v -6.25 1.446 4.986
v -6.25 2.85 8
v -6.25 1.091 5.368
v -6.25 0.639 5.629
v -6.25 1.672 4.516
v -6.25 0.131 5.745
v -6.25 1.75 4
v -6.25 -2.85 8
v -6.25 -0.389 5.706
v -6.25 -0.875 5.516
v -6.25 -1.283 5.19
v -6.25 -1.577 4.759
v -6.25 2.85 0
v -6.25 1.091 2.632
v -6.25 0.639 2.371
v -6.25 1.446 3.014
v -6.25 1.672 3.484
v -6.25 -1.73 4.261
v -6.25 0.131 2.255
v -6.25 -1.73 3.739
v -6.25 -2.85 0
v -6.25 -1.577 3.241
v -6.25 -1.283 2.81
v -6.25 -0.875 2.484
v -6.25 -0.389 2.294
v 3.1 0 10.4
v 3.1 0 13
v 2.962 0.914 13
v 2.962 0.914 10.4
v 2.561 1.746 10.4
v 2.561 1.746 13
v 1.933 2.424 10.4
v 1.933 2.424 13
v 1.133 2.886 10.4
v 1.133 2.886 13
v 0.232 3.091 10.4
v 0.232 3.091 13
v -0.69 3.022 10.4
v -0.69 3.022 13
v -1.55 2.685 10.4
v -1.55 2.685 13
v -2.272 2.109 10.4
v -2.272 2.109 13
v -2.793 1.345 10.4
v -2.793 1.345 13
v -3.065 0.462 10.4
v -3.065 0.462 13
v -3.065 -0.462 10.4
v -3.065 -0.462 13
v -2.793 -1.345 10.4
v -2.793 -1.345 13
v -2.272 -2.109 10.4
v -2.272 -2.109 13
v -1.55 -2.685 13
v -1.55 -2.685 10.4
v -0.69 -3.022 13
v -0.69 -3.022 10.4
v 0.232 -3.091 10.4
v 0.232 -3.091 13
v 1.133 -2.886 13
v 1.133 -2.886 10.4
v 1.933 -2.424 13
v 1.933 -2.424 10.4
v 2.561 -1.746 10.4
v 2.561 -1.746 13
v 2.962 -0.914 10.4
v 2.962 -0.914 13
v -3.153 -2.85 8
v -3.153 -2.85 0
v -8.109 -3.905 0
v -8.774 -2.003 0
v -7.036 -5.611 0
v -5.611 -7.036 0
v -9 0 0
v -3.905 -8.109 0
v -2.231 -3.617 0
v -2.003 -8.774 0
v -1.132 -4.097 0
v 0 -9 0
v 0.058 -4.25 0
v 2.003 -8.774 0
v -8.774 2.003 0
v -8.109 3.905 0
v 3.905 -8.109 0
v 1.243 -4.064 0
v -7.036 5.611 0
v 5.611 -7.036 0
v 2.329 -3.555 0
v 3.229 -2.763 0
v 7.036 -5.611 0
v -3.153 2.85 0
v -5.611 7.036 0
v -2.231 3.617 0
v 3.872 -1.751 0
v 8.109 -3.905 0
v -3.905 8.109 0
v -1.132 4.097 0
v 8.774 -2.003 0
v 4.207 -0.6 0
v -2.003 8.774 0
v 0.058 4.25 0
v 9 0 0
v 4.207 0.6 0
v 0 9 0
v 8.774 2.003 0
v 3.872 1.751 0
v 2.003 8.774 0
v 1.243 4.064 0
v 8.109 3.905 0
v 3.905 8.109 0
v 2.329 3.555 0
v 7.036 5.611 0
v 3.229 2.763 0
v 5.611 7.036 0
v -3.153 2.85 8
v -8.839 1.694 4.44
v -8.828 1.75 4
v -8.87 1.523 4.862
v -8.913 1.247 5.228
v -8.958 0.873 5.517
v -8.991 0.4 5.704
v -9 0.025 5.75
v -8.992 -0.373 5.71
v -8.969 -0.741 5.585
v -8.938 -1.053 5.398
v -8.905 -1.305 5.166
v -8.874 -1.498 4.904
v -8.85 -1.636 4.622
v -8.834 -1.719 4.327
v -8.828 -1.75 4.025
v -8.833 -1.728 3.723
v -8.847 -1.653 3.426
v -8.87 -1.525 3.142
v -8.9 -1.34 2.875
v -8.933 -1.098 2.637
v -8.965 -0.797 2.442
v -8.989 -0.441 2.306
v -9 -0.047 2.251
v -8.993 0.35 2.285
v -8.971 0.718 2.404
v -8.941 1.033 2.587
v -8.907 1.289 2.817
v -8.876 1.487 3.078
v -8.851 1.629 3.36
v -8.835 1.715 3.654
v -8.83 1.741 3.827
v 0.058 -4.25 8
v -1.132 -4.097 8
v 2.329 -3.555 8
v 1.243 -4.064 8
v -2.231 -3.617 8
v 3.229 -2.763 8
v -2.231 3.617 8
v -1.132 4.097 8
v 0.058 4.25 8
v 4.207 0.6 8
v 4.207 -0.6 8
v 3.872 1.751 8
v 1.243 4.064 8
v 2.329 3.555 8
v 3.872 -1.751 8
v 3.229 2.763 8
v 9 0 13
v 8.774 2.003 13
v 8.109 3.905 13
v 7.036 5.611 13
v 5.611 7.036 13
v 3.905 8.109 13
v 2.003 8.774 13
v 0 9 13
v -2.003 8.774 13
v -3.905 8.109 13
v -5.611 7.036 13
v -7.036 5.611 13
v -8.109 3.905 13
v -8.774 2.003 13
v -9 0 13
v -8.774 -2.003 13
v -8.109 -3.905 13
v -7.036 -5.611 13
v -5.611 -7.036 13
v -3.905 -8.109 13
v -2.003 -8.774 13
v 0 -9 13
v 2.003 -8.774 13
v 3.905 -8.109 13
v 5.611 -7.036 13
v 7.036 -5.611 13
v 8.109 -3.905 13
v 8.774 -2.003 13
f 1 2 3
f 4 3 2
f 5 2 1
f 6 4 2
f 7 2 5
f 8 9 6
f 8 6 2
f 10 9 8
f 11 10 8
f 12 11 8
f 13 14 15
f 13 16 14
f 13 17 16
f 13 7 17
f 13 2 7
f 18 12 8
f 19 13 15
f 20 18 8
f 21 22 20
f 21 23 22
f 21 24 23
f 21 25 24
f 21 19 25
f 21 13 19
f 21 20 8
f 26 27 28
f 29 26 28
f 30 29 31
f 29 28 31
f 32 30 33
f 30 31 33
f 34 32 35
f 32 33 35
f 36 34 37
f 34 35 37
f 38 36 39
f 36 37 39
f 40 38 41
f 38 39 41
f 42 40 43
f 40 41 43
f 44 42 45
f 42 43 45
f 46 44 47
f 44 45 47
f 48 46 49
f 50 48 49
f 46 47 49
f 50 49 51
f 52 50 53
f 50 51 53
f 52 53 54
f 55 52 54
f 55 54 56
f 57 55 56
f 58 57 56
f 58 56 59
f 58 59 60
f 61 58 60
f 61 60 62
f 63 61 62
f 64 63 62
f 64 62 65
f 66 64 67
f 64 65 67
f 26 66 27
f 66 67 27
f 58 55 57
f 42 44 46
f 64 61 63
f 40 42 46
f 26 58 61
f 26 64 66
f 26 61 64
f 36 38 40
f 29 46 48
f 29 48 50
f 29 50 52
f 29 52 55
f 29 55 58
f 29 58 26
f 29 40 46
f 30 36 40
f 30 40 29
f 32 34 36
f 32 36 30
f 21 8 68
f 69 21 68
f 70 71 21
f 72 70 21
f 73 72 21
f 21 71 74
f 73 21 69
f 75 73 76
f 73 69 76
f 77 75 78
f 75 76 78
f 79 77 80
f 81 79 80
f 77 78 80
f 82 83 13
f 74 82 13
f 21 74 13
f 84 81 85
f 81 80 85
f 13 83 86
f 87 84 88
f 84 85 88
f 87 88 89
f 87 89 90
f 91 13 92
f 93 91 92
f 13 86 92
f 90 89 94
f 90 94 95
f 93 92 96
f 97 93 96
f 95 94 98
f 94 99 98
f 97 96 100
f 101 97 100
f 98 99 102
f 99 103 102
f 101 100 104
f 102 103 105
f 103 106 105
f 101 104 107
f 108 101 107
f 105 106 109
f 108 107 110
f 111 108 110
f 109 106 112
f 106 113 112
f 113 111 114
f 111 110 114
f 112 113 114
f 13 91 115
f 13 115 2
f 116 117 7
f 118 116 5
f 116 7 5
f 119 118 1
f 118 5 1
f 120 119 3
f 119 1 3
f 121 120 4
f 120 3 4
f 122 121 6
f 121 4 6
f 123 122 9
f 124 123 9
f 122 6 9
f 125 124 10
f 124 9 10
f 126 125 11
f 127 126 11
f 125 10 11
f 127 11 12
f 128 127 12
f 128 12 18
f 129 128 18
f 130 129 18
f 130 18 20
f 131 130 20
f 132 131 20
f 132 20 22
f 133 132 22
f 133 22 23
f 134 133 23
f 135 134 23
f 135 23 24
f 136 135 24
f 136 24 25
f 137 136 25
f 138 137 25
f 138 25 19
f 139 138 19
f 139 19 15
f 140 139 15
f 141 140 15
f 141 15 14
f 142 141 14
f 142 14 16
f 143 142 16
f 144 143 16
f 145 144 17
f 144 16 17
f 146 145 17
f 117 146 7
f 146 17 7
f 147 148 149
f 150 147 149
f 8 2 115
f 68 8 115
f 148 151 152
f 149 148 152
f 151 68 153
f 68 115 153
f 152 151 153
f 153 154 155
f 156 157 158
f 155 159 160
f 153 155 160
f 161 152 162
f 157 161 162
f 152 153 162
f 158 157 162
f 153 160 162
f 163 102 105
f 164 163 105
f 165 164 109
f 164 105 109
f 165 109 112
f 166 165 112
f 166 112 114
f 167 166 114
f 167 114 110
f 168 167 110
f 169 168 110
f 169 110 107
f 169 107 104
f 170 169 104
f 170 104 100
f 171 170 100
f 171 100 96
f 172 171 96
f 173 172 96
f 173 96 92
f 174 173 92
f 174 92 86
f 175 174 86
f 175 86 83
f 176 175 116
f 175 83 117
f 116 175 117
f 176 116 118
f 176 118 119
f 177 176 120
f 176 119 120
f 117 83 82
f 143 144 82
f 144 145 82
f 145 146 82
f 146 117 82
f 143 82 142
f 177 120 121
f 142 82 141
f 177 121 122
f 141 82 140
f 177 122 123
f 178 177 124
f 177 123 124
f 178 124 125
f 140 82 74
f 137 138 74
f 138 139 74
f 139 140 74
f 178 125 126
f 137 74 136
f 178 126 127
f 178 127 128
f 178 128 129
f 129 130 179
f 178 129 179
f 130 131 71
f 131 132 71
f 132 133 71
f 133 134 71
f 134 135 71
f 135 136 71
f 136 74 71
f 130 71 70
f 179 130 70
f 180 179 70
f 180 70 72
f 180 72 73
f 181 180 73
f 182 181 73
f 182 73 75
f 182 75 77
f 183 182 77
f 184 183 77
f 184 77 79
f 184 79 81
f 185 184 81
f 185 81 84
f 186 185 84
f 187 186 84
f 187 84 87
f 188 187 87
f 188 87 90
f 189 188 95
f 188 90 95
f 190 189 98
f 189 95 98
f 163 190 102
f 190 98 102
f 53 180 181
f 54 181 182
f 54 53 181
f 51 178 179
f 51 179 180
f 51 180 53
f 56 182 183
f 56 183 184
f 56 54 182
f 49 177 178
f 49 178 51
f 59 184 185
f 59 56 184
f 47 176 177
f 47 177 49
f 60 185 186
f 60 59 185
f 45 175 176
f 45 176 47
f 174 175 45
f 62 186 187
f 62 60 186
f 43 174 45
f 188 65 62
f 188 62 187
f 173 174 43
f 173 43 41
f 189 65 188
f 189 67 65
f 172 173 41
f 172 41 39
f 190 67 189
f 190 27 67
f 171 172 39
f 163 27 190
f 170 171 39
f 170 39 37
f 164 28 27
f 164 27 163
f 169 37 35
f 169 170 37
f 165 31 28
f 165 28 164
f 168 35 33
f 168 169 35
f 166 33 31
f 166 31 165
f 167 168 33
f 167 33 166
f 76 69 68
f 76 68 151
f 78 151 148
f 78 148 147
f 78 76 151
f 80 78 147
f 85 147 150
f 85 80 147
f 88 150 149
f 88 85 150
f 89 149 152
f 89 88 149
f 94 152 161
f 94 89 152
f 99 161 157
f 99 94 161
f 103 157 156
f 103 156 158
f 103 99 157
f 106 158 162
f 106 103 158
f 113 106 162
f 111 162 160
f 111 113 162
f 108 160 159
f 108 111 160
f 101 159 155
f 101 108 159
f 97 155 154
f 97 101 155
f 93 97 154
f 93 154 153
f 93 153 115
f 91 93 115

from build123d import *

# Parameters (mm, degrees)
SKETCH136_R     = 9
PAD081_DEPTH    = 13
POCKET045_DEPTH = 8
SKETCH138_R     = 3.1
POCKET046_DEPTH = 2.6
SKETCH139_R     = 1.75
POCKET047_DEPTH = 9.001


with BuildPart() as part:
    # Sketch136 → Pad081 (new body)
    with BuildSketch(Plane.XY):
        Circle(SKETCH136_R)
    extrude(amount=PAD081_DEPTH)

    # Sketch137 → Pocket045 (cut)
    with BuildSketch(Plane.XY):
        with BuildLine():
            Line((-3.152776, 2.850001), (-6.25, 2.850001))
            Line((-6.25, 2.850001), (-6.25, -2.850001))
            Line((-6.25, -2.850001), (-3.152776, -2.850001))
            ThreePointArc((-3.152776, -2.850001), (4.25, 0), (-3.152776, 2.850001))
        make_face()
    extrude(amount=POCKET045_DEPTH, mode=Mode.SUBTRACT)

    # Sketch138 → Pocket046 (cut)
    with BuildSketch(Plane.XY.offset(13)):
        Circle(SKETCH138_R)
    extrude(amount=-POCKET046_DEPTH, mode=Mode.SUBTRACT)

    # Sketch139 → Pocket047 (cut, through all)
    with BuildSketch(Plane.YZ):
        with Locations((0, 4)):
            Circle(SKETCH139_R)
    extrude(amount=-POCKET047_DEPTH, mode=Mode.SUBTRACT)


solid = part.part
